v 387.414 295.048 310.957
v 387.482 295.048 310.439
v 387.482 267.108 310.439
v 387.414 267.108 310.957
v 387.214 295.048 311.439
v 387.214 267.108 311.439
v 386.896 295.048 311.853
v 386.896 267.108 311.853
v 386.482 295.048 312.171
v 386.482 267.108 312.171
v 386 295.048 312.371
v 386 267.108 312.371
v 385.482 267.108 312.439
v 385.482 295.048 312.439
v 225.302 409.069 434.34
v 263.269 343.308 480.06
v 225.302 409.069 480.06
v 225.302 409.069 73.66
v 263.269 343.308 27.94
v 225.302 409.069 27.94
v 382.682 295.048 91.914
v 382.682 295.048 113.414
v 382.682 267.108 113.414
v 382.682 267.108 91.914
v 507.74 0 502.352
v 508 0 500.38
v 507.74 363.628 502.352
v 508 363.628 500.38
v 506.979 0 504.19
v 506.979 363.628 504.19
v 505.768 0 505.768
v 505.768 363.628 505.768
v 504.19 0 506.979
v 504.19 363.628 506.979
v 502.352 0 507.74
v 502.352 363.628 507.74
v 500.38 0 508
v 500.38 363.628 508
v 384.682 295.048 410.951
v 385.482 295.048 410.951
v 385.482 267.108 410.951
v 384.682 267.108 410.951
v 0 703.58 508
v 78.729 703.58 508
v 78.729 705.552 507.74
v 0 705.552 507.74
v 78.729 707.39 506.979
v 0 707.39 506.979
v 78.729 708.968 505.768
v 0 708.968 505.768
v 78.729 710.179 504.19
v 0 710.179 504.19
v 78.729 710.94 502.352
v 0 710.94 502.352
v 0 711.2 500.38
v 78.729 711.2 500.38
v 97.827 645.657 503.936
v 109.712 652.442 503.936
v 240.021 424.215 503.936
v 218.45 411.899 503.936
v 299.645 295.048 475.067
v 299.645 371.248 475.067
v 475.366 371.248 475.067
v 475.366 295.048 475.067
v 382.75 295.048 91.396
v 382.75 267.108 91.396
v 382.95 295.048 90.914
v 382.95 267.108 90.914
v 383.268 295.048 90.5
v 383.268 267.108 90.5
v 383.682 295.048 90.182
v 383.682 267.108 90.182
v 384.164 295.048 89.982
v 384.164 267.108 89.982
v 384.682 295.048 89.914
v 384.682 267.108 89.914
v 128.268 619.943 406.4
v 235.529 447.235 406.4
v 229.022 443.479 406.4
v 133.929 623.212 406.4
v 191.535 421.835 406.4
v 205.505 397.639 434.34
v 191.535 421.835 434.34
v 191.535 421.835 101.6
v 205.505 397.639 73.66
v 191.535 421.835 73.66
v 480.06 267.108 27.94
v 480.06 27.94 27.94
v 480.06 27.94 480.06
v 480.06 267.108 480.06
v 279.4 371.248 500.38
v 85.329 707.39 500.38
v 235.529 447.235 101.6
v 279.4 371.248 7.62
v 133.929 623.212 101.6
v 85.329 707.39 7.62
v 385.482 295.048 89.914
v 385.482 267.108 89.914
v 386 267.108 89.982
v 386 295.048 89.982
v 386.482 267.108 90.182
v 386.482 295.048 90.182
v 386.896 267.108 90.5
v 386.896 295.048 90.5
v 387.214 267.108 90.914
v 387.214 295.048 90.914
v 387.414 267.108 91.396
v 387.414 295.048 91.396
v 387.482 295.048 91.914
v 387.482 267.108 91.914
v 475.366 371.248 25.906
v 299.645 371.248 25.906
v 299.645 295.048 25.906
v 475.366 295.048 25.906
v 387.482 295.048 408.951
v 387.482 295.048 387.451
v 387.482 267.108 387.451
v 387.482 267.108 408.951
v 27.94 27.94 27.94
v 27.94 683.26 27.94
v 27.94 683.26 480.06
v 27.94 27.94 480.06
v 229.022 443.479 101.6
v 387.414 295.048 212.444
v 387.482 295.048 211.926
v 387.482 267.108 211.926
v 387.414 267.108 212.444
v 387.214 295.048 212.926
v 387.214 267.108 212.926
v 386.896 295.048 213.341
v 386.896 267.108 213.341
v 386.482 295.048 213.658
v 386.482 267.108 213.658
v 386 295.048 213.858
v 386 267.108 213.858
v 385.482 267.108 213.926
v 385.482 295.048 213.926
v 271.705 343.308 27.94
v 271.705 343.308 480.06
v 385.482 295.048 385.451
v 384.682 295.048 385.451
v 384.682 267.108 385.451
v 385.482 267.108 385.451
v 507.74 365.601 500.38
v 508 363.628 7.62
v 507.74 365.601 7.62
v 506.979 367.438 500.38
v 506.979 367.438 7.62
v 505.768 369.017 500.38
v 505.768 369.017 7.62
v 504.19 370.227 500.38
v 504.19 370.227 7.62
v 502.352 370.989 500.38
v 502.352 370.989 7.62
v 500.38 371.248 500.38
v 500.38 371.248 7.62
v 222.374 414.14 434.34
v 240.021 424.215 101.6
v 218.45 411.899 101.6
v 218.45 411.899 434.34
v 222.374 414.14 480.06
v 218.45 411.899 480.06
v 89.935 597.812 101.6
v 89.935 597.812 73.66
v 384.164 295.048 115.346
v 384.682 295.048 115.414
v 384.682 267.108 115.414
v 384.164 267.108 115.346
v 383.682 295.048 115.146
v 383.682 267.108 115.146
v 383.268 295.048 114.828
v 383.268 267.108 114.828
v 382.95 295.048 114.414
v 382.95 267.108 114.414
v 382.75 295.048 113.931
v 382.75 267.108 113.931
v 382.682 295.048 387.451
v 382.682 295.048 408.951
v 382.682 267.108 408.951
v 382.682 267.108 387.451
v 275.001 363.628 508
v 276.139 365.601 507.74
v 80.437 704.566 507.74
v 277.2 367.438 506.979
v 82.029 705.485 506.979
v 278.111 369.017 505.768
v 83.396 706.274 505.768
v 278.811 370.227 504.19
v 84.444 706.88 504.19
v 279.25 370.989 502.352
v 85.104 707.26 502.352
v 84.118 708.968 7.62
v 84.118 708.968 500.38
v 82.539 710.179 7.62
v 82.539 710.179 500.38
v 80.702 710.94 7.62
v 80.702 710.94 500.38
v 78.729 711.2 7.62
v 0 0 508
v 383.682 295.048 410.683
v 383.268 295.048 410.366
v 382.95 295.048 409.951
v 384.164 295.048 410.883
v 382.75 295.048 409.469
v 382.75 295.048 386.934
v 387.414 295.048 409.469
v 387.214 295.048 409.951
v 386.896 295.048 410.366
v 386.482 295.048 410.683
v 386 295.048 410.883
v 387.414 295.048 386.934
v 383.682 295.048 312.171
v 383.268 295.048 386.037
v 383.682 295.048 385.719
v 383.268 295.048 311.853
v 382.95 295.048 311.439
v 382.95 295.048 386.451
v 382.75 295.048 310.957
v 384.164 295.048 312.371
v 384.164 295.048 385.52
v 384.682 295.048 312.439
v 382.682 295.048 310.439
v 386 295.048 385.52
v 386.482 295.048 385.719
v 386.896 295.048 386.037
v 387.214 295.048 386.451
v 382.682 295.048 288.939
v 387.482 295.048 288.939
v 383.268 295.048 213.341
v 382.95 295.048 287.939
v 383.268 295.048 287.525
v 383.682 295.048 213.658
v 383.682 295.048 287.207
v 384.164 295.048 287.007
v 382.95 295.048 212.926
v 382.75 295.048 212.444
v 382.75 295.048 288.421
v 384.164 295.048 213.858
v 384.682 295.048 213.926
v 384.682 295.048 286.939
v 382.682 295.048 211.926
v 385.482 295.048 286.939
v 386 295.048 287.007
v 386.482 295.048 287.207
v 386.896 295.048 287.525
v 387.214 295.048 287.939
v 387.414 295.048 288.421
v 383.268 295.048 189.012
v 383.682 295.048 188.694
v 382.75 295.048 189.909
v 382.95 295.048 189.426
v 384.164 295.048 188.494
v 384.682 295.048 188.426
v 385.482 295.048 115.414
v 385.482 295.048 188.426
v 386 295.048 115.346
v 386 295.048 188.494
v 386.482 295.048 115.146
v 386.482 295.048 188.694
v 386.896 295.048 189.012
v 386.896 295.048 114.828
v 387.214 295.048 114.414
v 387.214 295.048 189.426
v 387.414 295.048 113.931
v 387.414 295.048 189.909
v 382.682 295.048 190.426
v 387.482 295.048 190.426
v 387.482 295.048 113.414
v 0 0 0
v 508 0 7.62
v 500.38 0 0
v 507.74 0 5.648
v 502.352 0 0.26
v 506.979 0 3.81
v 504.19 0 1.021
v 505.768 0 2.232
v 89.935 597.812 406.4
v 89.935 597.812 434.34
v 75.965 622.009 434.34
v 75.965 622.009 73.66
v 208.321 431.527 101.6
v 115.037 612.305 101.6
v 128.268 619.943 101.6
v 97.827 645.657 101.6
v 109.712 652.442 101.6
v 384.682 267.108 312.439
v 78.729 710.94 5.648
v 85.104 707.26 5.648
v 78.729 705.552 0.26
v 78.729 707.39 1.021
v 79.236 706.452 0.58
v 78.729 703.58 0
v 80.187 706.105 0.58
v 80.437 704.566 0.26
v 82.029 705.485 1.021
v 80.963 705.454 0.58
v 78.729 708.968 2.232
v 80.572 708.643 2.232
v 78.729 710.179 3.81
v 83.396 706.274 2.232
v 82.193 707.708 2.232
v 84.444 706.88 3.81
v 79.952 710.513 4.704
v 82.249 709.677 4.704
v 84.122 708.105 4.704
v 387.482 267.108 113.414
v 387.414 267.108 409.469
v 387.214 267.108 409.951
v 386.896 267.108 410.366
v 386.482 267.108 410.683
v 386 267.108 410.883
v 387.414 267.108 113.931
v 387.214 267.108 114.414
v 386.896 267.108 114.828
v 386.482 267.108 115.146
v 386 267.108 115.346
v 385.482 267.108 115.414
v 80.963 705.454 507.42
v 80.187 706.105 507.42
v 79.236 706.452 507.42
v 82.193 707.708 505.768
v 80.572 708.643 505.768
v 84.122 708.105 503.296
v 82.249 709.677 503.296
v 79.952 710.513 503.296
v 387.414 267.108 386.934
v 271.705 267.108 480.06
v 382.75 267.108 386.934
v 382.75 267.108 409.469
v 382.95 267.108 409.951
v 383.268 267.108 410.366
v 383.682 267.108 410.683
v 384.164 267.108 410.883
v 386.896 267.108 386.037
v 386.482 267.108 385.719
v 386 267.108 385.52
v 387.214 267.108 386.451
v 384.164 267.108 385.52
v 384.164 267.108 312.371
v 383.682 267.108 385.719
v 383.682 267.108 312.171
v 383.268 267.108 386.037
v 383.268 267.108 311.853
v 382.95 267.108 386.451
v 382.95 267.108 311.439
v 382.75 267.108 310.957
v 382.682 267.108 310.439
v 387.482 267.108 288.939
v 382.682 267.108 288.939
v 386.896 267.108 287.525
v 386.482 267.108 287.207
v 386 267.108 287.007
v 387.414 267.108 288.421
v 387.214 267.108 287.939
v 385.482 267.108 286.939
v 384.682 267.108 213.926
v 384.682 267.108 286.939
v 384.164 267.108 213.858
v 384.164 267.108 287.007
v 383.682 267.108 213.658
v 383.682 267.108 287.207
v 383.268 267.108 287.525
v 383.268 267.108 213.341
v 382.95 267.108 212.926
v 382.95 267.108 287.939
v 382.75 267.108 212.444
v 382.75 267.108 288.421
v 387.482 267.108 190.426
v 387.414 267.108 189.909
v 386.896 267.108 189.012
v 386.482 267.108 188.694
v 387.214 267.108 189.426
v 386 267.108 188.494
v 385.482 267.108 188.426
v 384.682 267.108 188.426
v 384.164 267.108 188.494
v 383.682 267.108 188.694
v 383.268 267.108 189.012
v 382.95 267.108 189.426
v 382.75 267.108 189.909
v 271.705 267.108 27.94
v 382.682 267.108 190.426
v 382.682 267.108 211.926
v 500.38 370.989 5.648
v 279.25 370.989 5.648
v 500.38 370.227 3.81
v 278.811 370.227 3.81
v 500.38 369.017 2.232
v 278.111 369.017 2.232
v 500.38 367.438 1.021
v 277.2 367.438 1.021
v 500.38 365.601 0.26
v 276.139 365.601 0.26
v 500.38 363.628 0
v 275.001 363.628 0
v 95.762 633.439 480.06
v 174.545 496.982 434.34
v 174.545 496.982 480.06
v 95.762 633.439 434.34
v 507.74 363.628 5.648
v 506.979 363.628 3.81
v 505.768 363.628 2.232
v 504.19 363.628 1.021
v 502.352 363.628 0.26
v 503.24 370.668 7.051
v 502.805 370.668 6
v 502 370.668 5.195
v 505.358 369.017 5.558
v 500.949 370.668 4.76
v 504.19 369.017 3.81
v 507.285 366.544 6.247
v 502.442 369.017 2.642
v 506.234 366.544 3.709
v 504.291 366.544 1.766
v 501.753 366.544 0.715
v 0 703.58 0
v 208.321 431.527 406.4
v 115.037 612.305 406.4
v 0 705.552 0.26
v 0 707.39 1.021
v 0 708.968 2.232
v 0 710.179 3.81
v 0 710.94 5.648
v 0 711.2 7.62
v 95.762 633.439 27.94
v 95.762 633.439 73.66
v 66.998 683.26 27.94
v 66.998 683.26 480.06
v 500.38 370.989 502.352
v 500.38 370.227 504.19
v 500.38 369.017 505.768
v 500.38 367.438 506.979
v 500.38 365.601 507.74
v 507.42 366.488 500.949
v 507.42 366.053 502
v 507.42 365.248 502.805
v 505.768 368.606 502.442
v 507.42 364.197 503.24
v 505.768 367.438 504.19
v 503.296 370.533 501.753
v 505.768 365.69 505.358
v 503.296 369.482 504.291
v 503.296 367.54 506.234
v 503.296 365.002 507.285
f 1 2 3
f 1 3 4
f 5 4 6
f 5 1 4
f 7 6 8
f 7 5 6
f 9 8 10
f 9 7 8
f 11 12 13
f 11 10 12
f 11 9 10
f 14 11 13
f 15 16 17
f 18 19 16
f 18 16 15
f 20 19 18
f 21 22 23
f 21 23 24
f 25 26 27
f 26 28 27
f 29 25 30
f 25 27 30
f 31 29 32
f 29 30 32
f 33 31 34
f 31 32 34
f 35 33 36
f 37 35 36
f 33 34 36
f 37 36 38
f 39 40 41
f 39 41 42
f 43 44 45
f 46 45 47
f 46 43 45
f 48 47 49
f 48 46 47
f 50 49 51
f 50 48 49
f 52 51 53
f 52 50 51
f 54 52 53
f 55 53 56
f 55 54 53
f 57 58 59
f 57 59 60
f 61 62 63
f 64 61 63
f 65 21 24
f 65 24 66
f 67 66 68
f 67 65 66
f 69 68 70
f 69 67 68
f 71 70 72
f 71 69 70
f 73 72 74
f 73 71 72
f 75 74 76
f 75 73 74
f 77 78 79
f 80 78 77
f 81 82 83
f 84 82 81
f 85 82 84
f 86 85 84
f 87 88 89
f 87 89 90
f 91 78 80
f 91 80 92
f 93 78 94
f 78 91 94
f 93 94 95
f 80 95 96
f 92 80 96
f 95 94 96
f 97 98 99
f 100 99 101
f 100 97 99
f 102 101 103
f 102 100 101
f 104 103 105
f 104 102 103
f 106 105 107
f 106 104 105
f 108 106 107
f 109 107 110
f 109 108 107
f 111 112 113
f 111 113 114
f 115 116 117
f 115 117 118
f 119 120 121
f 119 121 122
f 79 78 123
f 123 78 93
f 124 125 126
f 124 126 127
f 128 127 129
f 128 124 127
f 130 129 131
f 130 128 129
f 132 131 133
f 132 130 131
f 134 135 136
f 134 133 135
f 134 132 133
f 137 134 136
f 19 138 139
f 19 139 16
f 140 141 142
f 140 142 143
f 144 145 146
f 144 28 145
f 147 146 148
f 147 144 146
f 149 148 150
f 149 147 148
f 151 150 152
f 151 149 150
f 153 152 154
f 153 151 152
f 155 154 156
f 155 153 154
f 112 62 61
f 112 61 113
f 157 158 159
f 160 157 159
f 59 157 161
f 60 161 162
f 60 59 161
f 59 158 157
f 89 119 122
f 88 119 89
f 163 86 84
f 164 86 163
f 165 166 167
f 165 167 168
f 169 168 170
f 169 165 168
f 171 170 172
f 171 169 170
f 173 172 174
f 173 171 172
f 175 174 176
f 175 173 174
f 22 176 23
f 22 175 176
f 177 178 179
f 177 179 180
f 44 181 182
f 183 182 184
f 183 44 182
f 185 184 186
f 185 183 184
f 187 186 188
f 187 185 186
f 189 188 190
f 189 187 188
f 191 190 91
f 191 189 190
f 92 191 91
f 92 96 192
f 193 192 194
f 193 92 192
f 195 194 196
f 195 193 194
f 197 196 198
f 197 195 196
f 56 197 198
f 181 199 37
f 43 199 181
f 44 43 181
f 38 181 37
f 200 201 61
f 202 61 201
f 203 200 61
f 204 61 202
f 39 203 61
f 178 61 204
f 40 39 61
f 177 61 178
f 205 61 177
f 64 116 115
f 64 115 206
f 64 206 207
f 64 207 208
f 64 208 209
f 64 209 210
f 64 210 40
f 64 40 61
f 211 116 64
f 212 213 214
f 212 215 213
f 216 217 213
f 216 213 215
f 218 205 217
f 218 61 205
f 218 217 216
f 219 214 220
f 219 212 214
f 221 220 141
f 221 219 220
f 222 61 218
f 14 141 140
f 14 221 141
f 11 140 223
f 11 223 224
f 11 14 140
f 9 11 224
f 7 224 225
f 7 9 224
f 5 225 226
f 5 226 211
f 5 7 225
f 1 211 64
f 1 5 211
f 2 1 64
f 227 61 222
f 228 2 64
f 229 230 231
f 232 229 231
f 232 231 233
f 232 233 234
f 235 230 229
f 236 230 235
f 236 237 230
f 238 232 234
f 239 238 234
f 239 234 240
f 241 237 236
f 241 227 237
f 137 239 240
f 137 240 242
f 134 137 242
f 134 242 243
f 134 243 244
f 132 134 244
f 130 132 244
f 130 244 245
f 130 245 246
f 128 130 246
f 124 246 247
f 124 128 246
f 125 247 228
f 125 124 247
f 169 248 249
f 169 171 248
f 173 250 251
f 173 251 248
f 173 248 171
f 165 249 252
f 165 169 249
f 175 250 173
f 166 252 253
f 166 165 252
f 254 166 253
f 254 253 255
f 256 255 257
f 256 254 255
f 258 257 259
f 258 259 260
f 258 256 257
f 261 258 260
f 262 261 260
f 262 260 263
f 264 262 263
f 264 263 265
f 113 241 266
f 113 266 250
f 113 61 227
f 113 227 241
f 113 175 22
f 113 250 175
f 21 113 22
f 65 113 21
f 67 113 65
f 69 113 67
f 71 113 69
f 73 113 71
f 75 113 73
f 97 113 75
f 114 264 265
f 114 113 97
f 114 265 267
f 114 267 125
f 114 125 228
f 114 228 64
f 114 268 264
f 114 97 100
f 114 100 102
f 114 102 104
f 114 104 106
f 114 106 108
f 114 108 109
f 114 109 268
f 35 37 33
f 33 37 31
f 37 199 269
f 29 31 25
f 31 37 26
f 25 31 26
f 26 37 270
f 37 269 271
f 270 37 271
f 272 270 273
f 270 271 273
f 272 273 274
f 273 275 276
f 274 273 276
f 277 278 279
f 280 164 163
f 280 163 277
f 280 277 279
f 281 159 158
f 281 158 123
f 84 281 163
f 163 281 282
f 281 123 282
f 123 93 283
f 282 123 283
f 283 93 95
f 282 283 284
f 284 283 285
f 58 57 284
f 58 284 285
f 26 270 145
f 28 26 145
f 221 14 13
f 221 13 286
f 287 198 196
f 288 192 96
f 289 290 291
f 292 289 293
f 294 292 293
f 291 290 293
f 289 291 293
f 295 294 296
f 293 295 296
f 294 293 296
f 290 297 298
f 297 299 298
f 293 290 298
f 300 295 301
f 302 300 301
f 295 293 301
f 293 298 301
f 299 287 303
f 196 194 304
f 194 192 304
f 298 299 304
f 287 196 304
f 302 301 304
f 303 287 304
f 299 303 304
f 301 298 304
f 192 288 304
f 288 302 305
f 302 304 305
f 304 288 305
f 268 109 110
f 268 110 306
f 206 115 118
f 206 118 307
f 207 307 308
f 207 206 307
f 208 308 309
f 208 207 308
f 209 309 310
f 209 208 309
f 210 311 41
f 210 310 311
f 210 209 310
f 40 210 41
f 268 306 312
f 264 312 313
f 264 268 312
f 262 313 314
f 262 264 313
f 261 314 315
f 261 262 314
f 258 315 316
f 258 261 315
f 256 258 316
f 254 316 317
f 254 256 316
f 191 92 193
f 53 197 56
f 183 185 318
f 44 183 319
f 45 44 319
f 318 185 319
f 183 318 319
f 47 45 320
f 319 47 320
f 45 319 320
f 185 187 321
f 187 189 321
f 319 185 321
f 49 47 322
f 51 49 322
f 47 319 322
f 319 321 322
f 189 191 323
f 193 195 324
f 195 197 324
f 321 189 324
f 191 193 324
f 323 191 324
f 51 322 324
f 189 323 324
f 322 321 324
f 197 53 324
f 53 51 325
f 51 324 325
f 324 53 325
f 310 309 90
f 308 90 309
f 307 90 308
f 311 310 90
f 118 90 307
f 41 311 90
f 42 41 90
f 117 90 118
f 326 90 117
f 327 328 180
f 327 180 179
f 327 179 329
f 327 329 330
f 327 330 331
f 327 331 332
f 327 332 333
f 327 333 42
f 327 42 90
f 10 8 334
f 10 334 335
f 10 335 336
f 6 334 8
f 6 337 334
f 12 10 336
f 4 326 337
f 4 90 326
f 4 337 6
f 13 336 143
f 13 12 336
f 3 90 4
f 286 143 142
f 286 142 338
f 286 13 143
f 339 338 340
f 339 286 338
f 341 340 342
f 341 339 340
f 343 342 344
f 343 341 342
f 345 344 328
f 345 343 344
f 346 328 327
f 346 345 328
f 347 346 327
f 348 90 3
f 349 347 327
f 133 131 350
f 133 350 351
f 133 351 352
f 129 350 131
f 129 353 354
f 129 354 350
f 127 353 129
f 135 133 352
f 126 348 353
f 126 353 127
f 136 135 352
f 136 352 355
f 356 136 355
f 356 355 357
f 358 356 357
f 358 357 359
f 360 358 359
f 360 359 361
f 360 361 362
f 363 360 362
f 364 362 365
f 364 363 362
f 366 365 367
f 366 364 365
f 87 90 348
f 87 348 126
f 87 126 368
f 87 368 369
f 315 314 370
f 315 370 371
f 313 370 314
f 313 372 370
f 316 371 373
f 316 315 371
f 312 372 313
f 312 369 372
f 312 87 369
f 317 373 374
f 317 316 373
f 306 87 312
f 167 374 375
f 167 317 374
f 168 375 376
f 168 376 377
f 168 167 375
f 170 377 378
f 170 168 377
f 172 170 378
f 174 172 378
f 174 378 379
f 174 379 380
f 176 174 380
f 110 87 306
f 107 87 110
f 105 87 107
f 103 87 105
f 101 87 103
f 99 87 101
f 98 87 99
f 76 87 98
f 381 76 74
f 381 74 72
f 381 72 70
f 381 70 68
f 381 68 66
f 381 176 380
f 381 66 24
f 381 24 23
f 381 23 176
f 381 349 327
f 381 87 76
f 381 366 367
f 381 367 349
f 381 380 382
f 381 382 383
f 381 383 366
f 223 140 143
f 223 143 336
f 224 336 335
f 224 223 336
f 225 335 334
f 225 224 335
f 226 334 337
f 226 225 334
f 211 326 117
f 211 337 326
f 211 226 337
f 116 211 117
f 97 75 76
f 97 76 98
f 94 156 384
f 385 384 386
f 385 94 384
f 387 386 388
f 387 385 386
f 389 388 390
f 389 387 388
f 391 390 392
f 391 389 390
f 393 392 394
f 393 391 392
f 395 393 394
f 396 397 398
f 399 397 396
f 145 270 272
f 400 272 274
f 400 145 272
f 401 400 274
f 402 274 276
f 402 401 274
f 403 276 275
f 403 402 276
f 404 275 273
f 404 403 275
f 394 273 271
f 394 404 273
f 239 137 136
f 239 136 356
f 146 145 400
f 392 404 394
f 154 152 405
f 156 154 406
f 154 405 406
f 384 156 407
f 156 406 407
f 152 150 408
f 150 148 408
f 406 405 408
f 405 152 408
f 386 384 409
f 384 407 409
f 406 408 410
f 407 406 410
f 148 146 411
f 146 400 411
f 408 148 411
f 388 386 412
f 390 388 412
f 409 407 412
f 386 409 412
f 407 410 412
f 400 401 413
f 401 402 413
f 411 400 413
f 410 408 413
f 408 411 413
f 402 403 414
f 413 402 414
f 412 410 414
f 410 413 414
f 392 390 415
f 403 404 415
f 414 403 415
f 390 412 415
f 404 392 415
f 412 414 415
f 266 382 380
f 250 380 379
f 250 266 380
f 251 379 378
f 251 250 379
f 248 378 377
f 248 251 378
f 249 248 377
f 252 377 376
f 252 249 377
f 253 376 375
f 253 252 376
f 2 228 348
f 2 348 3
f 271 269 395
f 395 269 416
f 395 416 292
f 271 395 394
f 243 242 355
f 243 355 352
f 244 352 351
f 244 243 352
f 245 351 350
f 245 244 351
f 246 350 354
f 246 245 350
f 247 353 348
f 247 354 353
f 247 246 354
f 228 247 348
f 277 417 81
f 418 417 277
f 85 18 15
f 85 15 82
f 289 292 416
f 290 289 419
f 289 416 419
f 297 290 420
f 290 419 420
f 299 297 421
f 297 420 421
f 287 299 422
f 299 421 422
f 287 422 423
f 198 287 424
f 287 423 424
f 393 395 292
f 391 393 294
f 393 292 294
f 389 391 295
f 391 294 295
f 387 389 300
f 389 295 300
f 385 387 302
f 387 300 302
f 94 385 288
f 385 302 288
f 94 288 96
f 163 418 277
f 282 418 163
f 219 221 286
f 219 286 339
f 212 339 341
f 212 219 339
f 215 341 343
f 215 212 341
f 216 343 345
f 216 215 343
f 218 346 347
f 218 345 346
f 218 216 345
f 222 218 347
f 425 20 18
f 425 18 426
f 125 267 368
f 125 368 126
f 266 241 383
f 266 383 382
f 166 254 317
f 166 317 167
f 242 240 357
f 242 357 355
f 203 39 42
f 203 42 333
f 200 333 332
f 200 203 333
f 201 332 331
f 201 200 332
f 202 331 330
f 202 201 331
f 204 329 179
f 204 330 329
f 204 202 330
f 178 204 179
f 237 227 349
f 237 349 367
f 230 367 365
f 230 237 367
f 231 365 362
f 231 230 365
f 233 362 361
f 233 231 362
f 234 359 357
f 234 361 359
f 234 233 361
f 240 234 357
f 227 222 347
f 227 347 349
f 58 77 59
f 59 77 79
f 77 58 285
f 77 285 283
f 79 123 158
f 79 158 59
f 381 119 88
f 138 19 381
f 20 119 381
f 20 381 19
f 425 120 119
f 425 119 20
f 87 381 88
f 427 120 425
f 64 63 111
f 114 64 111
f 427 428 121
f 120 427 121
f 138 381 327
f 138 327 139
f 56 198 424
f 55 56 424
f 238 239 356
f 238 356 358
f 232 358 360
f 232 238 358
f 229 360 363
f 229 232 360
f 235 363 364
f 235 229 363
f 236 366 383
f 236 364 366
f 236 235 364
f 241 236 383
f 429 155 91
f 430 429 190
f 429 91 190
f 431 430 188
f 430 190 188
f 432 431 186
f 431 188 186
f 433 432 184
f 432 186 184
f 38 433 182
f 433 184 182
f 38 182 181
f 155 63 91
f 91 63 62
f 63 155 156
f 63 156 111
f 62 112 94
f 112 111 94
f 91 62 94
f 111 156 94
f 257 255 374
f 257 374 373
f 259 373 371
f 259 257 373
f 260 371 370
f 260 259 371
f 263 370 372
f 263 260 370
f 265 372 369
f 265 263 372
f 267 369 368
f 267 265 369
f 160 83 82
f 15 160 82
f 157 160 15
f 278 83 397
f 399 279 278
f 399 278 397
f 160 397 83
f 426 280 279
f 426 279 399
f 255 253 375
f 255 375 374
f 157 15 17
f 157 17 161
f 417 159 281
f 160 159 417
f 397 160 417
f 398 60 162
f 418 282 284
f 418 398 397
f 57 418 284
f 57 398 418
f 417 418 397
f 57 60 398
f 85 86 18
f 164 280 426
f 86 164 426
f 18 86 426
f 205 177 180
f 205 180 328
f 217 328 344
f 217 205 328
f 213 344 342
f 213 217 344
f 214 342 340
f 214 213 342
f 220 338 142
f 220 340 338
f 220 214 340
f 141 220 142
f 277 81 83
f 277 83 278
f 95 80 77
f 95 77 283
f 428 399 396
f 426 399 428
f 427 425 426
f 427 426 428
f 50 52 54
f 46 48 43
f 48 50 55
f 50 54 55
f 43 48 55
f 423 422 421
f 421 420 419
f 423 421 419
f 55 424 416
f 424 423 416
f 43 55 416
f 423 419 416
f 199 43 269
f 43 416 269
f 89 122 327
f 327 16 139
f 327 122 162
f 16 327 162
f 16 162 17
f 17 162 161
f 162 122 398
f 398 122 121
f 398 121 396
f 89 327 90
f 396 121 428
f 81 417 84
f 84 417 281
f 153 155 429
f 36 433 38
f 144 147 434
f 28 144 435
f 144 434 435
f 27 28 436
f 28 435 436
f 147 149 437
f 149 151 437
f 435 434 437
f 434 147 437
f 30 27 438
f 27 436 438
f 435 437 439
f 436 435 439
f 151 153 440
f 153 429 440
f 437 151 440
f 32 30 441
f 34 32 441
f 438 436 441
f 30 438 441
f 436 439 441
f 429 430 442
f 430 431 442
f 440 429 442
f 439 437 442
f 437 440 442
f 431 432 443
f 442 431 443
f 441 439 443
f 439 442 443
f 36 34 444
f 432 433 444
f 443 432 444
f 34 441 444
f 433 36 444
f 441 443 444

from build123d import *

# Parameters (mm, degrees)
BOSS_EXTRUDE1_DEPTH            = 508
SKETCH2_W                      = 175.72130466
SKETCH2_H                      = 449.160798253
CUT_EXTRUDE1_DEPTH             = 76.2
SKETCH3_W                      = 304.8
SKETCH3_H                      = 203.2
CUT_EXTRUDE3_DEPTH             = 50.8
SHELL2_START                   = 27.94
SHELL2_DEPTH                   = 452.12
SHELL2_2_DEPTH                 = 45.72
SHELL2_START_2                 = 434.34
SHELL2_3_DEPTH                 = 45.72
FILLET1_R                      = 7.62
CUT_EXTRUDE4_REACH             = 965.862
CUT_EXTRUDE4_DIRECTION_2_DEPTH = 97.536
CUT_EXTRUDE5_REACH             = 832.247


# Read off the part's stored shape, not the designer's step: Shell2
with BuildPart() as part:
    # Sketch1 → Boss-Extrude1 (new body)
    with BuildSketch(Plane.XY):
        Polygon((508, 0), (508, 371.248348728), (279.4, 371.248348728), (83.128822626, 711.2), (0, 711.2), (0, 0), align=None)
    extrude(amount=BOSS_EXTRUDE1_DEPTH)

    # Sketch2 → Cut-Extrude1 (cut)
    with BuildSketch(Plane(origin=(0, 371.248348728, 0), x_dir=(1, 0, 0), z_dir=(0, 1, 0))):
        with Locations((387.505332687, -250.48614125)):
            Rectangle(SKETCH2_W, SKETCH2_H)
    extrude(amount=-CUT_EXTRUDE1_DEPTH, mode=Mode.SUBTRACT)

    # Sketch3 → Cut-Extrude3 (cut)
    with BuildSketch(Plane(origin=(370.305250556, 213.795836091, 0), x_dir=(0, 0, -1), z_dir=(0.8660254037844397, 0.49999999999999806, 0))):
        with Locations((-254, 371.152855858)):
            Rectangle(SKETCH3_W, SKETCH3_H)
    extrude(amount=-CUT_EXTRUDE3_DEPTH, mode=Mode.SUBTRACT)

    # Shell2 outline → Shell2 (cut)
    with BuildSketch(Plane.XY.offset(SHELL2_START)):
        Polygon((27.94, 27.94), (480.06, 27.94), (480.06, 267.108348728), (271.704680357, 267.108348728), (271.704680357, 343.308348728), (263.268833479, 343.308348728), (225.302072845, 409.068707145), (205.504732114, 397.638707145), (191.534732114, 421.835456927), (89.934732114, 597.811818976), (75.964732114, 622.008568757), (95.762072845, 633.438568757), (66.997656105, 683.26), (27.94, 683.26), align=None)
    extrude(amount=SHELL2_DEPTH, mode=Mode.SUBTRACT)

    # Shell2 2 outline → Shell2 2 (cut)
    with BuildSketch(Plane.XY.offset(SHELL2_START)):
        Polygon((225.302072845, 409.068707145), (95.762072845, 633.438568757), (75.964732114, 622.008568757), (89.934732114, 597.811818976), (191.534732114, 421.835456927), (205.504732114, 397.638707145), align=None)
    extrude(amount=SHELL2_2_DEPTH, mode=Mode.SUBTRACT)

    # Shell2 3 outline → Shell2 3 (cut)
    with BuildSketch(Plane.XY.offset(SHELL2_START_2)):
        Polygon((225.302072845, 409.068707145), (95.762072845, 633.438568757), (75.964732114, 622.008568757), (89.934732114, 597.811818976), (191.534732114, 421.835456927), (205.504732114, 397.638707145), align=None)
    extrude(amount=SHELL2_3_DEPTH, mode=Mode.SUBTRACT)

    # Fillet1
    fillet1_edges = [part.edges().sort_by_distance(p)[0] for p in [
        (508, 185.624174364, 0),
        (393.7, 371.248348728, 508),
        (83.128822626, 711.2, 254),
        (508, 371.248348728, 254),
        (181.264411313, 541.224174364, 508),
        (41.564411313, 711.2, 508),
        (508, 185.624174364, 508),
        (41.564411313, 711.2, 0),
        (181.264411313, 541.224174364, 0),
        (393.7, 371.248348728, 0),
    ]]
    fillet(fillet1_edges, radius=FILLET1_R)

    # Cut-Extrude4: up to this face of the body (flat: up to its plane)
    cut_extrude4_end = Plane(part.part.faces().sort_by_distance((162.73177737, 522.523637951, 101.6))[0])
    # Sketch6 → Cut-Extrude4 (cut, up to the picked face)
    with BuildSketch(Plane(origin=(0, 0, 406.4), x_dir=(-1, 0, 0), z_dir=(0, 0, -1)), mode=Mode.PRIVATE) as cut_extrude4_sk1:
        Polygon((-109.711824261, 652.442307464), (-240.02087993, 424.214985446), (-218.44952186, 411.898566558), (-97.827125151, 645.656599669), align=None)
    cut_extrude4_tool1 = split(extrude(cut_extrude4_sk1.sketch, amount=CUT_EXTRUDE4_REACH, mode=Mode.PRIVATE), bisect_by=cut_extrude4_end, keep=Keep.BOTH, mode=Mode.PRIVATE)
    add(cut_extrude4_tool1.solids().sort_by(Axis((172.556766, 522.406417, 406.4), (0, 0, -1)))[0], mode=Mode.SUBTRACT)

    # Sketch6 → Cut-Extrude4 direction 2 (cut)
    with BuildSketch(Plane(origin=(0, 0, 406.4), x_dir=(-1, 0, 0), z_dir=(0, 0, -1))):
        Polygon((-109.711824261, 652.442307464), (-240.02087993, 424.214985446), (-218.44952186, 411.898566558), (-97.827125151, 645.656599669), align=None)
    extrude(amount=-CUT_EXTRUDE4_DIRECTION_2_DEPTH, mode=Mode.SUBTRACT)

    # Sketch10 → Cut-Extrude5 (cut, up to next)
    with BuildSketch(Plane(origin=(0, 295.048348728, 0), x_dir=(1, 0, 0), z_dir=(0, 1, 0)), mode=Mode.PRIVATE) as cut_extrude5_sk1:
        with BuildLine():
            Line((384.681985017, -385.451435914), (385.481985017, -385.451435914))
            ThreePointArc((385.481985017, -385.451435914), (386.896198579, -386.037222352), (387.481985017, -387.451435914))
            Line((387.481985017, -387.451435914), (387.481985017, -408.951435914))
            ThreePointArc((387.481985017, -408.951435914), (386.896198579, -410.365649476), (385.481985017, -410.951435914))
            Line((385.481985017, -410.951435914), (384.681985017, -410.951435914))
            ThreePointArc((384.681985017, -410.951435914), (383.267771454, -410.365649476), (382.681985017, -408.951435914))
            Line((382.681985017, -408.951435914), (382.681985017, -387.451435914))
            ThreePointArc((382.681985017, -387.451435914), (383.267771454, -386.037222352), (384.681985017, -385.451435914))
        make_face()
    cut_extrude5_tool1 = extrude(cut_extrude5_sk1.sketch, amount=-CUT_EXTRUDE5_REACH, mode=Mode.PRIVATE) & part.part
    # Sketch10 → Cut-Extrude5 (cut, up to next)
    with BuildSketch(Plane(origin=(0, 295.048348728, 0), x_dir=(1, 0, 0), z_dir=(0, 1, 0)), mode=Mode.PRIVATE) as cut_extrude5_sk2:
        with BuildLine():
            Line((385.481985017, -312.438871317), (384.681985017, -312.438871317))
            ThreePointArc((384.681985017, -312.438871317), (383.267771454, -311.853084879), (382.681985017, -310.438871317))
            Line((382.681985017, -310.438871317), (382.681985017, -288.938871317))
            ThreePointArc((382.681985017, -288.938871317), (383.267771454, -287.524657755), (384.681985017, -286.938871317))
            Line((384.681985017, -286.938871317), (385.481985017, -286.938871317))
            ThreePointArc((385.481985017, -286.938871317), (386.896198579, -287.524657755), (387.481985017, -288.938871317))
            Line((387.481985017, -288.938871317), (387.481985017, -310.438871317))
            ThreePointArc((387.481985017, -310.438871317), (386.896198579, -311.853084879), (385.481985017, -312.438871317))
        make_face()
    cut_extrude5_tool2 = extrude(cut_extrude5_sk2.sketch, amount=-CUT_EXTRUDE5_REACH, mode=Mode.PRIVATE) & part.part
    # Sketch10 → Cut-Extrude5 (cut, up to next)
    with BuildSketch(Plane(origin=(0, 295.048348728, 0), x_dir=(1, 0, 0), z_dir=(0, 1, 0)), mode=Mode.PRIVATE) as cut_extrude5_sk3:
        with BuildLine():
            Line((385.481985017, -213.92630672), (384.681985017, -213.92630672))
            ThreePointArc((384.681985017, -213.92630672), (383.267771454, -213.340520282), (382.681985017, -211.92630672))
            Line((382.681985017, -211.92630672), (382.681985017, -190.42630672))
            ThreePointArc((382.681985017, -190.42630672), (383.267771454, -189.012093158), (384.681985017, -188.42630672))
            Line((384.681985017, -188.42630672), (385.481985017, -188.42630672))
            ThreePointArc((385.481985017, -188.42630672), (386.896198579, -189.012093158), (387.481985017, -190.42630672))
            Line((387.481985017, -190.42630672), (387.481985017, -211.92630672))
            ThreePointArc((387.481985017, -211.92630672), (386.896198579, -213.340520282), (385.481985017, -213.92630672))
        make_face()
    cut_extrude5_tool3 = extrude(cut_extrude5_sk3.sketch, amount=-CUT_EXTRUDE5_REACH, mode=Mode.PRIVATE) & part.part
    # Sketch10 → Cut-Extrude5 (cut, up to next)
    with BuildSketch(Plane(origin=(0, 295.048348728, 0), x_dir=(1, 0, 0), z_dir=(0, 1, 0)), mode=Mode.PRIVATE) as cut_extrude5_sk4:
        with BuildLine():
            Line((385.481985017, -115.413742123), (384.681985017, -115.413742123))
            ThreePointArc((384.681985017, -115.413742123), (383.267771454, -114.827955685), (382.681985017, -113.413742123))
            Line((382.681985017, -113.413742123), (382.681985017, -91.913742123))
            ThreePointArc((382.681985017, -91.913742123), (383.267771454, -90.499528561), (384.681985017, -89.913742123))
            Line((384.681985017, -89.913742123), (385.481985017, -89.913742123))
            ThreePointArc((385.481985017, -89.913742123), (386.896198579, -90.499528561), (387.481985017, -91.913742123))
            Line((387.481985017, -91.913742123), (387.481985017, -113.413742123))
            ThreePointArc((387.481985017, -113.413742123), (386.896198579, -114.827955685), (385.481985017, -115.413742123))
        make_face()
    cut_extrude5_tool4 = extrude(cut_extrude5_sk4.sketch, amount=-CUT_EXTRUDE5_REACH, mode=Mode.PRIVATE) & part.part
    add(cut_extrude5_tool1.solids().sort_by_distance((385.081985, 295.048349, 398.201436))[0], mode=Mode.SUBTRACT)
    add(cut_extrude5_tool2.solids().sort_by_distance((385.081985, 295.048349, 299.688871))[0], mode=Mode.SUBTRACT)
    add(cut_extrude5_tool3.solids().sort_by_distance((385.081985, 295.048349, 201.176307))[0], mode=Mode.SUBTRACT)
    add(cut_extrude5_tool4.solids().sort_by_distance((385.081985, 295.048349, 102.663742))[0], mode=Mode.SUBTRACT)


solid = part.part
